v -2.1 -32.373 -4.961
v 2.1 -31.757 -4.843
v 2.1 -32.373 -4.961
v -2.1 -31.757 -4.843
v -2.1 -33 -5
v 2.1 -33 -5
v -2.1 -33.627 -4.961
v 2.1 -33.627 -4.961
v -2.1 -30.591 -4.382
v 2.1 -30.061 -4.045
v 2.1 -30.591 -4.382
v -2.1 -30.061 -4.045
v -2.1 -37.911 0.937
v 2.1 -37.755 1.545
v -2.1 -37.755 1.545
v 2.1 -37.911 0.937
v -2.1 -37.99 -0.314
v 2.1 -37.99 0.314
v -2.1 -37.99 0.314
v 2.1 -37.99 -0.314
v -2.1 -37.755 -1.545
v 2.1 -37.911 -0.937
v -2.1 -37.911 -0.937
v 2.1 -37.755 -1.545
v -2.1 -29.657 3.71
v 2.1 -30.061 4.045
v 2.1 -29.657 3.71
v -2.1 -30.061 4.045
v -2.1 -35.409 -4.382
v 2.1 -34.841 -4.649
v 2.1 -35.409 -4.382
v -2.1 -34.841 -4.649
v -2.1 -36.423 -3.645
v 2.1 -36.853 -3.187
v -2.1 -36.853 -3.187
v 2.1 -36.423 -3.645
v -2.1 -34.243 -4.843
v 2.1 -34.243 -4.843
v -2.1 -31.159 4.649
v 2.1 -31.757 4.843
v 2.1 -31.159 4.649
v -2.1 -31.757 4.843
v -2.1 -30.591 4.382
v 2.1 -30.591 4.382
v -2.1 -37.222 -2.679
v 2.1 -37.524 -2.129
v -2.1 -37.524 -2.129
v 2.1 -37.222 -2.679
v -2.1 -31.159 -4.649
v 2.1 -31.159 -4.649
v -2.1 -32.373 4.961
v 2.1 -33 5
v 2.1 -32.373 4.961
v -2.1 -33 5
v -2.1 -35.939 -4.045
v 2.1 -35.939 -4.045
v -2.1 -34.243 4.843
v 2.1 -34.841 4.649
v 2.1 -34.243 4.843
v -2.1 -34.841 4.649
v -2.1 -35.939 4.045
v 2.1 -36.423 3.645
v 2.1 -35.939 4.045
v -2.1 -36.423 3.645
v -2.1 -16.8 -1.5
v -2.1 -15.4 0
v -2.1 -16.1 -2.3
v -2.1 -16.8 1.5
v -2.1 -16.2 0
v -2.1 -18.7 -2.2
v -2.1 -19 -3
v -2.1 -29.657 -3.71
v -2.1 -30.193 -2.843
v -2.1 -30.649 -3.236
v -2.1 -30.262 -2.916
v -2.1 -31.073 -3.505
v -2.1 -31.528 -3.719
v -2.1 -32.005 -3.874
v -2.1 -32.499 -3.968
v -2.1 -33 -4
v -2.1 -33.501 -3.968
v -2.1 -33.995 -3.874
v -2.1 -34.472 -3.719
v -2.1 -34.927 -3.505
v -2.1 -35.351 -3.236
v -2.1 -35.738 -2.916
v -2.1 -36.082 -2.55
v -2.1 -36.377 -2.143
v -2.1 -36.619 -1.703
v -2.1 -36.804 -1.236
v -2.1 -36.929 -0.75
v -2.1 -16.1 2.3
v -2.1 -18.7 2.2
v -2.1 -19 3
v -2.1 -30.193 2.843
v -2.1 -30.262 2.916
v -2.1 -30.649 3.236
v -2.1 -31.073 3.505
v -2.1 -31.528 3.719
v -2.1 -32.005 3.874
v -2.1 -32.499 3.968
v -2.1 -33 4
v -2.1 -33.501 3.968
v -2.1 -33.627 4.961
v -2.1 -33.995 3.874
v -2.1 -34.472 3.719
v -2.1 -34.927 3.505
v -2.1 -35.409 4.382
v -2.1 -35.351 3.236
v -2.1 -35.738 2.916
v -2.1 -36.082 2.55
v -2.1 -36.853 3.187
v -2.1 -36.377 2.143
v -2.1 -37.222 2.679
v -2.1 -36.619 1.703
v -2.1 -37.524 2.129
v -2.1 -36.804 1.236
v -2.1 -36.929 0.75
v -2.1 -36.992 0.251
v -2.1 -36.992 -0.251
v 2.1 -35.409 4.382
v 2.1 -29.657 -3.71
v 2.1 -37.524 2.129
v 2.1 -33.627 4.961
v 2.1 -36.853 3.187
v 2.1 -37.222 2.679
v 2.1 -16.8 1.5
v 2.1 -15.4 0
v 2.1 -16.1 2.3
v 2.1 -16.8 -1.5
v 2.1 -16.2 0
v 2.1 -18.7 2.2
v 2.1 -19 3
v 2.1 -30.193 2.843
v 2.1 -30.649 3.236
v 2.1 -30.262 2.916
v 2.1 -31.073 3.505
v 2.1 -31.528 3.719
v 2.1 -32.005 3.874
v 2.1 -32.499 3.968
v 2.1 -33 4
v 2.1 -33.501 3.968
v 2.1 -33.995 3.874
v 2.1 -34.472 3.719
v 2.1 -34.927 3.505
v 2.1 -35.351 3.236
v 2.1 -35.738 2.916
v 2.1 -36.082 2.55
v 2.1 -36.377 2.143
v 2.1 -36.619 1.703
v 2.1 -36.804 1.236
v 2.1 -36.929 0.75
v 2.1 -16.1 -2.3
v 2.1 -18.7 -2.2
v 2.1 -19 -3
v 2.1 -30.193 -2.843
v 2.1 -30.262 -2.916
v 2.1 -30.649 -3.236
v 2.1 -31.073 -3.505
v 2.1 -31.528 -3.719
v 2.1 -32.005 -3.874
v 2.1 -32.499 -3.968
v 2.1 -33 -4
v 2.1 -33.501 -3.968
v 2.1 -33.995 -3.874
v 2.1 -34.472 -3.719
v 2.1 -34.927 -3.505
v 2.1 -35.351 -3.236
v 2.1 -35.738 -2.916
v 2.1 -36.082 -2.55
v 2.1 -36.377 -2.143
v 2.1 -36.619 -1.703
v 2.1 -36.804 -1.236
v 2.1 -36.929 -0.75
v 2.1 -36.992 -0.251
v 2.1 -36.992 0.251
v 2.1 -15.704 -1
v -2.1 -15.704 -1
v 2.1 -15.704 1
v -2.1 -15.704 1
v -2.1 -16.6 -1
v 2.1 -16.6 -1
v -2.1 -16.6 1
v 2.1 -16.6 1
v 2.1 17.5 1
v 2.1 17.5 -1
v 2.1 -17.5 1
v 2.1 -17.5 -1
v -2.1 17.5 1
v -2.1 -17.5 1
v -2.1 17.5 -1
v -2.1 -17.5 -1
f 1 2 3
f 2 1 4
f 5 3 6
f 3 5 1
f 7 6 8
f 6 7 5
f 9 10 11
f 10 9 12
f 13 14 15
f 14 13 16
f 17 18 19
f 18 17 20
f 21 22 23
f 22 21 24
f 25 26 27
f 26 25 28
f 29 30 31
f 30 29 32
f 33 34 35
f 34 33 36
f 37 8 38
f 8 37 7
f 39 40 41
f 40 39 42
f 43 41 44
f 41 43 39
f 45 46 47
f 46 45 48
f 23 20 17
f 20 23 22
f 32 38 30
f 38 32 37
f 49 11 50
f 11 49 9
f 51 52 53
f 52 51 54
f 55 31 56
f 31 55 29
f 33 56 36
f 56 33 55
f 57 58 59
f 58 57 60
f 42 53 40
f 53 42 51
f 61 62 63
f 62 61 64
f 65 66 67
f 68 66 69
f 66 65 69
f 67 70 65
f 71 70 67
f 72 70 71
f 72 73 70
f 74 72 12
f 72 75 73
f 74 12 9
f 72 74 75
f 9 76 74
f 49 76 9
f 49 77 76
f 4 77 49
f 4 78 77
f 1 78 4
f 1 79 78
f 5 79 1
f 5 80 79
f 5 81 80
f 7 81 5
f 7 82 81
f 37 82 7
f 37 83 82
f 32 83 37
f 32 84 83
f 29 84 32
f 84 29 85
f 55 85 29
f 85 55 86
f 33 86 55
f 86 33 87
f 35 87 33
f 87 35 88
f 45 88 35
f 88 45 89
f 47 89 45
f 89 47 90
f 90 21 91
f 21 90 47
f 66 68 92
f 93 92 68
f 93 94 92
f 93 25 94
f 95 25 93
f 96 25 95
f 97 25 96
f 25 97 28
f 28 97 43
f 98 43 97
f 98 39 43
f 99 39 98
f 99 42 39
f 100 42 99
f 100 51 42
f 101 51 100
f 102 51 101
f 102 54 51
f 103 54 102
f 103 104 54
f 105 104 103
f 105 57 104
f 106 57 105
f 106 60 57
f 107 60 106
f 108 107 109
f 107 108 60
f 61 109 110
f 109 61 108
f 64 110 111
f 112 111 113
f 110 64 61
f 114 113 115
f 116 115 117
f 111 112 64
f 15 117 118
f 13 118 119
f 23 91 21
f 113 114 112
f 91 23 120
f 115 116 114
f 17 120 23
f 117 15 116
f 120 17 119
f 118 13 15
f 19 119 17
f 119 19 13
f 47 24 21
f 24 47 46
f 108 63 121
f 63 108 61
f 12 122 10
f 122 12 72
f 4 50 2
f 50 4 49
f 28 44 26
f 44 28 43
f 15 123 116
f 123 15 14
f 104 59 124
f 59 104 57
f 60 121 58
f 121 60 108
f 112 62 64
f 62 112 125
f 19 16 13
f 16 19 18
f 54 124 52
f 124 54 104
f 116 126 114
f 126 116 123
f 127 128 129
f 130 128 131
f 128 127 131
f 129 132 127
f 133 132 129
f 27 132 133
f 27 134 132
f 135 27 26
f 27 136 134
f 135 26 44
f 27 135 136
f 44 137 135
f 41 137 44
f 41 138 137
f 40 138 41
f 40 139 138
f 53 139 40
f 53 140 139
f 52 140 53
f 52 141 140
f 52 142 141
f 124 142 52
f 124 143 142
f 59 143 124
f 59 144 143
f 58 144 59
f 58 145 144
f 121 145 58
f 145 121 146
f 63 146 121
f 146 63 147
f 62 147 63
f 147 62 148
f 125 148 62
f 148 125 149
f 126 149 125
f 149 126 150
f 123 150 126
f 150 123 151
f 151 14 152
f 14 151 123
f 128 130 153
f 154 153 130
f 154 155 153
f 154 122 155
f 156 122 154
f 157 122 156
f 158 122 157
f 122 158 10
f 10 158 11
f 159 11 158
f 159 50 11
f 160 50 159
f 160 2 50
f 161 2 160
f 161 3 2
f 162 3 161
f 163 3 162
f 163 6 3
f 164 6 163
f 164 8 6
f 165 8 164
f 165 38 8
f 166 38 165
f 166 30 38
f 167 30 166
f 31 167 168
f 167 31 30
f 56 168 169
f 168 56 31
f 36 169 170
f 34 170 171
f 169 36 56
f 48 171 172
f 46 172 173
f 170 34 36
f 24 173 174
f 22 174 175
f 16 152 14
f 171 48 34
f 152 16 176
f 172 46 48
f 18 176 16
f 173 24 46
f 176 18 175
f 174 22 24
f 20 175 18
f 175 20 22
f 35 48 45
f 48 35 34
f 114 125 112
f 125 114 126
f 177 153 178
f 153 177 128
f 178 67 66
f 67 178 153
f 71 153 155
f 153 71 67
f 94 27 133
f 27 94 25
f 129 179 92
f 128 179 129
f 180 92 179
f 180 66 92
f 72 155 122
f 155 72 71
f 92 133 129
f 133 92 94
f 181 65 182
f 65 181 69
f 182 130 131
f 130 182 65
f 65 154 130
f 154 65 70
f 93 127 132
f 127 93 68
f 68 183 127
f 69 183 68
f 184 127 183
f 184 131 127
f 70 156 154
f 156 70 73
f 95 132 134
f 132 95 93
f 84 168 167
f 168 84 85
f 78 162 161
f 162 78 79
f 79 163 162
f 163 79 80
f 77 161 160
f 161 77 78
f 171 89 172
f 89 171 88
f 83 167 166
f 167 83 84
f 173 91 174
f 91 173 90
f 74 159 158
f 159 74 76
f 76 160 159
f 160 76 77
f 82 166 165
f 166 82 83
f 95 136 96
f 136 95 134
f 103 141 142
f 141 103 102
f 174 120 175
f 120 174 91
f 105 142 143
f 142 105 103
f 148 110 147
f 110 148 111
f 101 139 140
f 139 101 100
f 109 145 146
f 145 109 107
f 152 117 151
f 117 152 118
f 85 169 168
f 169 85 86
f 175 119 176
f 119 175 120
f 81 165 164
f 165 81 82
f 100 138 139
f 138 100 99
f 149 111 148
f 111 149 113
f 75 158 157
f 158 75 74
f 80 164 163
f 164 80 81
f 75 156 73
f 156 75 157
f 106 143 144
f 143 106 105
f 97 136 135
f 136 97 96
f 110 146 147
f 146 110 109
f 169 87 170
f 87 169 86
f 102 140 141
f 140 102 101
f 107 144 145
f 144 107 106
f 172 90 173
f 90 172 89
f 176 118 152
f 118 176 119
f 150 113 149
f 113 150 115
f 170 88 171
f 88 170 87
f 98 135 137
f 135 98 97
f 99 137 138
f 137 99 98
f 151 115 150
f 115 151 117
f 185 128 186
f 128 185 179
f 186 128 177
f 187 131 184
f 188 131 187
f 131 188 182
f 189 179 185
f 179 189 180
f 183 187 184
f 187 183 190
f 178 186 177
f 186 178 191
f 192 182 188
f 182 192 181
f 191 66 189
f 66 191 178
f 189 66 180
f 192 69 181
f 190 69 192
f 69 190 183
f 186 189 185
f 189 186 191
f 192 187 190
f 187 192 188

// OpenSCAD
// file: servo_connector.scad
$fn=50;

difference(){

    union(){
        cylinder(d=10, 4.2);
        linear_extrude(4.2){
            polygon([[-4,-1],[-3,14],[-2.3,16.9],[0,17.6],[2.3,16.9],[3,14],[4,-1]]);
        }
    }

    translate([0,0,-.1]){
        linear_extrude(5){
        polygon([[-3,0],[-2.2,14.3],[-1.5,16.2],[0,16.8],[1.5,16.2],[2.2,14.3],[3,0]]);
        }
    }
    
    cylinder(d=8, 10, center=true);
}
// main file
cube([4.2,35,2], center=true);

translate([-2.1,-66/2,0]){
    rotate([0,90,0]){
    include<servo_connector.scad>;
    }
}
